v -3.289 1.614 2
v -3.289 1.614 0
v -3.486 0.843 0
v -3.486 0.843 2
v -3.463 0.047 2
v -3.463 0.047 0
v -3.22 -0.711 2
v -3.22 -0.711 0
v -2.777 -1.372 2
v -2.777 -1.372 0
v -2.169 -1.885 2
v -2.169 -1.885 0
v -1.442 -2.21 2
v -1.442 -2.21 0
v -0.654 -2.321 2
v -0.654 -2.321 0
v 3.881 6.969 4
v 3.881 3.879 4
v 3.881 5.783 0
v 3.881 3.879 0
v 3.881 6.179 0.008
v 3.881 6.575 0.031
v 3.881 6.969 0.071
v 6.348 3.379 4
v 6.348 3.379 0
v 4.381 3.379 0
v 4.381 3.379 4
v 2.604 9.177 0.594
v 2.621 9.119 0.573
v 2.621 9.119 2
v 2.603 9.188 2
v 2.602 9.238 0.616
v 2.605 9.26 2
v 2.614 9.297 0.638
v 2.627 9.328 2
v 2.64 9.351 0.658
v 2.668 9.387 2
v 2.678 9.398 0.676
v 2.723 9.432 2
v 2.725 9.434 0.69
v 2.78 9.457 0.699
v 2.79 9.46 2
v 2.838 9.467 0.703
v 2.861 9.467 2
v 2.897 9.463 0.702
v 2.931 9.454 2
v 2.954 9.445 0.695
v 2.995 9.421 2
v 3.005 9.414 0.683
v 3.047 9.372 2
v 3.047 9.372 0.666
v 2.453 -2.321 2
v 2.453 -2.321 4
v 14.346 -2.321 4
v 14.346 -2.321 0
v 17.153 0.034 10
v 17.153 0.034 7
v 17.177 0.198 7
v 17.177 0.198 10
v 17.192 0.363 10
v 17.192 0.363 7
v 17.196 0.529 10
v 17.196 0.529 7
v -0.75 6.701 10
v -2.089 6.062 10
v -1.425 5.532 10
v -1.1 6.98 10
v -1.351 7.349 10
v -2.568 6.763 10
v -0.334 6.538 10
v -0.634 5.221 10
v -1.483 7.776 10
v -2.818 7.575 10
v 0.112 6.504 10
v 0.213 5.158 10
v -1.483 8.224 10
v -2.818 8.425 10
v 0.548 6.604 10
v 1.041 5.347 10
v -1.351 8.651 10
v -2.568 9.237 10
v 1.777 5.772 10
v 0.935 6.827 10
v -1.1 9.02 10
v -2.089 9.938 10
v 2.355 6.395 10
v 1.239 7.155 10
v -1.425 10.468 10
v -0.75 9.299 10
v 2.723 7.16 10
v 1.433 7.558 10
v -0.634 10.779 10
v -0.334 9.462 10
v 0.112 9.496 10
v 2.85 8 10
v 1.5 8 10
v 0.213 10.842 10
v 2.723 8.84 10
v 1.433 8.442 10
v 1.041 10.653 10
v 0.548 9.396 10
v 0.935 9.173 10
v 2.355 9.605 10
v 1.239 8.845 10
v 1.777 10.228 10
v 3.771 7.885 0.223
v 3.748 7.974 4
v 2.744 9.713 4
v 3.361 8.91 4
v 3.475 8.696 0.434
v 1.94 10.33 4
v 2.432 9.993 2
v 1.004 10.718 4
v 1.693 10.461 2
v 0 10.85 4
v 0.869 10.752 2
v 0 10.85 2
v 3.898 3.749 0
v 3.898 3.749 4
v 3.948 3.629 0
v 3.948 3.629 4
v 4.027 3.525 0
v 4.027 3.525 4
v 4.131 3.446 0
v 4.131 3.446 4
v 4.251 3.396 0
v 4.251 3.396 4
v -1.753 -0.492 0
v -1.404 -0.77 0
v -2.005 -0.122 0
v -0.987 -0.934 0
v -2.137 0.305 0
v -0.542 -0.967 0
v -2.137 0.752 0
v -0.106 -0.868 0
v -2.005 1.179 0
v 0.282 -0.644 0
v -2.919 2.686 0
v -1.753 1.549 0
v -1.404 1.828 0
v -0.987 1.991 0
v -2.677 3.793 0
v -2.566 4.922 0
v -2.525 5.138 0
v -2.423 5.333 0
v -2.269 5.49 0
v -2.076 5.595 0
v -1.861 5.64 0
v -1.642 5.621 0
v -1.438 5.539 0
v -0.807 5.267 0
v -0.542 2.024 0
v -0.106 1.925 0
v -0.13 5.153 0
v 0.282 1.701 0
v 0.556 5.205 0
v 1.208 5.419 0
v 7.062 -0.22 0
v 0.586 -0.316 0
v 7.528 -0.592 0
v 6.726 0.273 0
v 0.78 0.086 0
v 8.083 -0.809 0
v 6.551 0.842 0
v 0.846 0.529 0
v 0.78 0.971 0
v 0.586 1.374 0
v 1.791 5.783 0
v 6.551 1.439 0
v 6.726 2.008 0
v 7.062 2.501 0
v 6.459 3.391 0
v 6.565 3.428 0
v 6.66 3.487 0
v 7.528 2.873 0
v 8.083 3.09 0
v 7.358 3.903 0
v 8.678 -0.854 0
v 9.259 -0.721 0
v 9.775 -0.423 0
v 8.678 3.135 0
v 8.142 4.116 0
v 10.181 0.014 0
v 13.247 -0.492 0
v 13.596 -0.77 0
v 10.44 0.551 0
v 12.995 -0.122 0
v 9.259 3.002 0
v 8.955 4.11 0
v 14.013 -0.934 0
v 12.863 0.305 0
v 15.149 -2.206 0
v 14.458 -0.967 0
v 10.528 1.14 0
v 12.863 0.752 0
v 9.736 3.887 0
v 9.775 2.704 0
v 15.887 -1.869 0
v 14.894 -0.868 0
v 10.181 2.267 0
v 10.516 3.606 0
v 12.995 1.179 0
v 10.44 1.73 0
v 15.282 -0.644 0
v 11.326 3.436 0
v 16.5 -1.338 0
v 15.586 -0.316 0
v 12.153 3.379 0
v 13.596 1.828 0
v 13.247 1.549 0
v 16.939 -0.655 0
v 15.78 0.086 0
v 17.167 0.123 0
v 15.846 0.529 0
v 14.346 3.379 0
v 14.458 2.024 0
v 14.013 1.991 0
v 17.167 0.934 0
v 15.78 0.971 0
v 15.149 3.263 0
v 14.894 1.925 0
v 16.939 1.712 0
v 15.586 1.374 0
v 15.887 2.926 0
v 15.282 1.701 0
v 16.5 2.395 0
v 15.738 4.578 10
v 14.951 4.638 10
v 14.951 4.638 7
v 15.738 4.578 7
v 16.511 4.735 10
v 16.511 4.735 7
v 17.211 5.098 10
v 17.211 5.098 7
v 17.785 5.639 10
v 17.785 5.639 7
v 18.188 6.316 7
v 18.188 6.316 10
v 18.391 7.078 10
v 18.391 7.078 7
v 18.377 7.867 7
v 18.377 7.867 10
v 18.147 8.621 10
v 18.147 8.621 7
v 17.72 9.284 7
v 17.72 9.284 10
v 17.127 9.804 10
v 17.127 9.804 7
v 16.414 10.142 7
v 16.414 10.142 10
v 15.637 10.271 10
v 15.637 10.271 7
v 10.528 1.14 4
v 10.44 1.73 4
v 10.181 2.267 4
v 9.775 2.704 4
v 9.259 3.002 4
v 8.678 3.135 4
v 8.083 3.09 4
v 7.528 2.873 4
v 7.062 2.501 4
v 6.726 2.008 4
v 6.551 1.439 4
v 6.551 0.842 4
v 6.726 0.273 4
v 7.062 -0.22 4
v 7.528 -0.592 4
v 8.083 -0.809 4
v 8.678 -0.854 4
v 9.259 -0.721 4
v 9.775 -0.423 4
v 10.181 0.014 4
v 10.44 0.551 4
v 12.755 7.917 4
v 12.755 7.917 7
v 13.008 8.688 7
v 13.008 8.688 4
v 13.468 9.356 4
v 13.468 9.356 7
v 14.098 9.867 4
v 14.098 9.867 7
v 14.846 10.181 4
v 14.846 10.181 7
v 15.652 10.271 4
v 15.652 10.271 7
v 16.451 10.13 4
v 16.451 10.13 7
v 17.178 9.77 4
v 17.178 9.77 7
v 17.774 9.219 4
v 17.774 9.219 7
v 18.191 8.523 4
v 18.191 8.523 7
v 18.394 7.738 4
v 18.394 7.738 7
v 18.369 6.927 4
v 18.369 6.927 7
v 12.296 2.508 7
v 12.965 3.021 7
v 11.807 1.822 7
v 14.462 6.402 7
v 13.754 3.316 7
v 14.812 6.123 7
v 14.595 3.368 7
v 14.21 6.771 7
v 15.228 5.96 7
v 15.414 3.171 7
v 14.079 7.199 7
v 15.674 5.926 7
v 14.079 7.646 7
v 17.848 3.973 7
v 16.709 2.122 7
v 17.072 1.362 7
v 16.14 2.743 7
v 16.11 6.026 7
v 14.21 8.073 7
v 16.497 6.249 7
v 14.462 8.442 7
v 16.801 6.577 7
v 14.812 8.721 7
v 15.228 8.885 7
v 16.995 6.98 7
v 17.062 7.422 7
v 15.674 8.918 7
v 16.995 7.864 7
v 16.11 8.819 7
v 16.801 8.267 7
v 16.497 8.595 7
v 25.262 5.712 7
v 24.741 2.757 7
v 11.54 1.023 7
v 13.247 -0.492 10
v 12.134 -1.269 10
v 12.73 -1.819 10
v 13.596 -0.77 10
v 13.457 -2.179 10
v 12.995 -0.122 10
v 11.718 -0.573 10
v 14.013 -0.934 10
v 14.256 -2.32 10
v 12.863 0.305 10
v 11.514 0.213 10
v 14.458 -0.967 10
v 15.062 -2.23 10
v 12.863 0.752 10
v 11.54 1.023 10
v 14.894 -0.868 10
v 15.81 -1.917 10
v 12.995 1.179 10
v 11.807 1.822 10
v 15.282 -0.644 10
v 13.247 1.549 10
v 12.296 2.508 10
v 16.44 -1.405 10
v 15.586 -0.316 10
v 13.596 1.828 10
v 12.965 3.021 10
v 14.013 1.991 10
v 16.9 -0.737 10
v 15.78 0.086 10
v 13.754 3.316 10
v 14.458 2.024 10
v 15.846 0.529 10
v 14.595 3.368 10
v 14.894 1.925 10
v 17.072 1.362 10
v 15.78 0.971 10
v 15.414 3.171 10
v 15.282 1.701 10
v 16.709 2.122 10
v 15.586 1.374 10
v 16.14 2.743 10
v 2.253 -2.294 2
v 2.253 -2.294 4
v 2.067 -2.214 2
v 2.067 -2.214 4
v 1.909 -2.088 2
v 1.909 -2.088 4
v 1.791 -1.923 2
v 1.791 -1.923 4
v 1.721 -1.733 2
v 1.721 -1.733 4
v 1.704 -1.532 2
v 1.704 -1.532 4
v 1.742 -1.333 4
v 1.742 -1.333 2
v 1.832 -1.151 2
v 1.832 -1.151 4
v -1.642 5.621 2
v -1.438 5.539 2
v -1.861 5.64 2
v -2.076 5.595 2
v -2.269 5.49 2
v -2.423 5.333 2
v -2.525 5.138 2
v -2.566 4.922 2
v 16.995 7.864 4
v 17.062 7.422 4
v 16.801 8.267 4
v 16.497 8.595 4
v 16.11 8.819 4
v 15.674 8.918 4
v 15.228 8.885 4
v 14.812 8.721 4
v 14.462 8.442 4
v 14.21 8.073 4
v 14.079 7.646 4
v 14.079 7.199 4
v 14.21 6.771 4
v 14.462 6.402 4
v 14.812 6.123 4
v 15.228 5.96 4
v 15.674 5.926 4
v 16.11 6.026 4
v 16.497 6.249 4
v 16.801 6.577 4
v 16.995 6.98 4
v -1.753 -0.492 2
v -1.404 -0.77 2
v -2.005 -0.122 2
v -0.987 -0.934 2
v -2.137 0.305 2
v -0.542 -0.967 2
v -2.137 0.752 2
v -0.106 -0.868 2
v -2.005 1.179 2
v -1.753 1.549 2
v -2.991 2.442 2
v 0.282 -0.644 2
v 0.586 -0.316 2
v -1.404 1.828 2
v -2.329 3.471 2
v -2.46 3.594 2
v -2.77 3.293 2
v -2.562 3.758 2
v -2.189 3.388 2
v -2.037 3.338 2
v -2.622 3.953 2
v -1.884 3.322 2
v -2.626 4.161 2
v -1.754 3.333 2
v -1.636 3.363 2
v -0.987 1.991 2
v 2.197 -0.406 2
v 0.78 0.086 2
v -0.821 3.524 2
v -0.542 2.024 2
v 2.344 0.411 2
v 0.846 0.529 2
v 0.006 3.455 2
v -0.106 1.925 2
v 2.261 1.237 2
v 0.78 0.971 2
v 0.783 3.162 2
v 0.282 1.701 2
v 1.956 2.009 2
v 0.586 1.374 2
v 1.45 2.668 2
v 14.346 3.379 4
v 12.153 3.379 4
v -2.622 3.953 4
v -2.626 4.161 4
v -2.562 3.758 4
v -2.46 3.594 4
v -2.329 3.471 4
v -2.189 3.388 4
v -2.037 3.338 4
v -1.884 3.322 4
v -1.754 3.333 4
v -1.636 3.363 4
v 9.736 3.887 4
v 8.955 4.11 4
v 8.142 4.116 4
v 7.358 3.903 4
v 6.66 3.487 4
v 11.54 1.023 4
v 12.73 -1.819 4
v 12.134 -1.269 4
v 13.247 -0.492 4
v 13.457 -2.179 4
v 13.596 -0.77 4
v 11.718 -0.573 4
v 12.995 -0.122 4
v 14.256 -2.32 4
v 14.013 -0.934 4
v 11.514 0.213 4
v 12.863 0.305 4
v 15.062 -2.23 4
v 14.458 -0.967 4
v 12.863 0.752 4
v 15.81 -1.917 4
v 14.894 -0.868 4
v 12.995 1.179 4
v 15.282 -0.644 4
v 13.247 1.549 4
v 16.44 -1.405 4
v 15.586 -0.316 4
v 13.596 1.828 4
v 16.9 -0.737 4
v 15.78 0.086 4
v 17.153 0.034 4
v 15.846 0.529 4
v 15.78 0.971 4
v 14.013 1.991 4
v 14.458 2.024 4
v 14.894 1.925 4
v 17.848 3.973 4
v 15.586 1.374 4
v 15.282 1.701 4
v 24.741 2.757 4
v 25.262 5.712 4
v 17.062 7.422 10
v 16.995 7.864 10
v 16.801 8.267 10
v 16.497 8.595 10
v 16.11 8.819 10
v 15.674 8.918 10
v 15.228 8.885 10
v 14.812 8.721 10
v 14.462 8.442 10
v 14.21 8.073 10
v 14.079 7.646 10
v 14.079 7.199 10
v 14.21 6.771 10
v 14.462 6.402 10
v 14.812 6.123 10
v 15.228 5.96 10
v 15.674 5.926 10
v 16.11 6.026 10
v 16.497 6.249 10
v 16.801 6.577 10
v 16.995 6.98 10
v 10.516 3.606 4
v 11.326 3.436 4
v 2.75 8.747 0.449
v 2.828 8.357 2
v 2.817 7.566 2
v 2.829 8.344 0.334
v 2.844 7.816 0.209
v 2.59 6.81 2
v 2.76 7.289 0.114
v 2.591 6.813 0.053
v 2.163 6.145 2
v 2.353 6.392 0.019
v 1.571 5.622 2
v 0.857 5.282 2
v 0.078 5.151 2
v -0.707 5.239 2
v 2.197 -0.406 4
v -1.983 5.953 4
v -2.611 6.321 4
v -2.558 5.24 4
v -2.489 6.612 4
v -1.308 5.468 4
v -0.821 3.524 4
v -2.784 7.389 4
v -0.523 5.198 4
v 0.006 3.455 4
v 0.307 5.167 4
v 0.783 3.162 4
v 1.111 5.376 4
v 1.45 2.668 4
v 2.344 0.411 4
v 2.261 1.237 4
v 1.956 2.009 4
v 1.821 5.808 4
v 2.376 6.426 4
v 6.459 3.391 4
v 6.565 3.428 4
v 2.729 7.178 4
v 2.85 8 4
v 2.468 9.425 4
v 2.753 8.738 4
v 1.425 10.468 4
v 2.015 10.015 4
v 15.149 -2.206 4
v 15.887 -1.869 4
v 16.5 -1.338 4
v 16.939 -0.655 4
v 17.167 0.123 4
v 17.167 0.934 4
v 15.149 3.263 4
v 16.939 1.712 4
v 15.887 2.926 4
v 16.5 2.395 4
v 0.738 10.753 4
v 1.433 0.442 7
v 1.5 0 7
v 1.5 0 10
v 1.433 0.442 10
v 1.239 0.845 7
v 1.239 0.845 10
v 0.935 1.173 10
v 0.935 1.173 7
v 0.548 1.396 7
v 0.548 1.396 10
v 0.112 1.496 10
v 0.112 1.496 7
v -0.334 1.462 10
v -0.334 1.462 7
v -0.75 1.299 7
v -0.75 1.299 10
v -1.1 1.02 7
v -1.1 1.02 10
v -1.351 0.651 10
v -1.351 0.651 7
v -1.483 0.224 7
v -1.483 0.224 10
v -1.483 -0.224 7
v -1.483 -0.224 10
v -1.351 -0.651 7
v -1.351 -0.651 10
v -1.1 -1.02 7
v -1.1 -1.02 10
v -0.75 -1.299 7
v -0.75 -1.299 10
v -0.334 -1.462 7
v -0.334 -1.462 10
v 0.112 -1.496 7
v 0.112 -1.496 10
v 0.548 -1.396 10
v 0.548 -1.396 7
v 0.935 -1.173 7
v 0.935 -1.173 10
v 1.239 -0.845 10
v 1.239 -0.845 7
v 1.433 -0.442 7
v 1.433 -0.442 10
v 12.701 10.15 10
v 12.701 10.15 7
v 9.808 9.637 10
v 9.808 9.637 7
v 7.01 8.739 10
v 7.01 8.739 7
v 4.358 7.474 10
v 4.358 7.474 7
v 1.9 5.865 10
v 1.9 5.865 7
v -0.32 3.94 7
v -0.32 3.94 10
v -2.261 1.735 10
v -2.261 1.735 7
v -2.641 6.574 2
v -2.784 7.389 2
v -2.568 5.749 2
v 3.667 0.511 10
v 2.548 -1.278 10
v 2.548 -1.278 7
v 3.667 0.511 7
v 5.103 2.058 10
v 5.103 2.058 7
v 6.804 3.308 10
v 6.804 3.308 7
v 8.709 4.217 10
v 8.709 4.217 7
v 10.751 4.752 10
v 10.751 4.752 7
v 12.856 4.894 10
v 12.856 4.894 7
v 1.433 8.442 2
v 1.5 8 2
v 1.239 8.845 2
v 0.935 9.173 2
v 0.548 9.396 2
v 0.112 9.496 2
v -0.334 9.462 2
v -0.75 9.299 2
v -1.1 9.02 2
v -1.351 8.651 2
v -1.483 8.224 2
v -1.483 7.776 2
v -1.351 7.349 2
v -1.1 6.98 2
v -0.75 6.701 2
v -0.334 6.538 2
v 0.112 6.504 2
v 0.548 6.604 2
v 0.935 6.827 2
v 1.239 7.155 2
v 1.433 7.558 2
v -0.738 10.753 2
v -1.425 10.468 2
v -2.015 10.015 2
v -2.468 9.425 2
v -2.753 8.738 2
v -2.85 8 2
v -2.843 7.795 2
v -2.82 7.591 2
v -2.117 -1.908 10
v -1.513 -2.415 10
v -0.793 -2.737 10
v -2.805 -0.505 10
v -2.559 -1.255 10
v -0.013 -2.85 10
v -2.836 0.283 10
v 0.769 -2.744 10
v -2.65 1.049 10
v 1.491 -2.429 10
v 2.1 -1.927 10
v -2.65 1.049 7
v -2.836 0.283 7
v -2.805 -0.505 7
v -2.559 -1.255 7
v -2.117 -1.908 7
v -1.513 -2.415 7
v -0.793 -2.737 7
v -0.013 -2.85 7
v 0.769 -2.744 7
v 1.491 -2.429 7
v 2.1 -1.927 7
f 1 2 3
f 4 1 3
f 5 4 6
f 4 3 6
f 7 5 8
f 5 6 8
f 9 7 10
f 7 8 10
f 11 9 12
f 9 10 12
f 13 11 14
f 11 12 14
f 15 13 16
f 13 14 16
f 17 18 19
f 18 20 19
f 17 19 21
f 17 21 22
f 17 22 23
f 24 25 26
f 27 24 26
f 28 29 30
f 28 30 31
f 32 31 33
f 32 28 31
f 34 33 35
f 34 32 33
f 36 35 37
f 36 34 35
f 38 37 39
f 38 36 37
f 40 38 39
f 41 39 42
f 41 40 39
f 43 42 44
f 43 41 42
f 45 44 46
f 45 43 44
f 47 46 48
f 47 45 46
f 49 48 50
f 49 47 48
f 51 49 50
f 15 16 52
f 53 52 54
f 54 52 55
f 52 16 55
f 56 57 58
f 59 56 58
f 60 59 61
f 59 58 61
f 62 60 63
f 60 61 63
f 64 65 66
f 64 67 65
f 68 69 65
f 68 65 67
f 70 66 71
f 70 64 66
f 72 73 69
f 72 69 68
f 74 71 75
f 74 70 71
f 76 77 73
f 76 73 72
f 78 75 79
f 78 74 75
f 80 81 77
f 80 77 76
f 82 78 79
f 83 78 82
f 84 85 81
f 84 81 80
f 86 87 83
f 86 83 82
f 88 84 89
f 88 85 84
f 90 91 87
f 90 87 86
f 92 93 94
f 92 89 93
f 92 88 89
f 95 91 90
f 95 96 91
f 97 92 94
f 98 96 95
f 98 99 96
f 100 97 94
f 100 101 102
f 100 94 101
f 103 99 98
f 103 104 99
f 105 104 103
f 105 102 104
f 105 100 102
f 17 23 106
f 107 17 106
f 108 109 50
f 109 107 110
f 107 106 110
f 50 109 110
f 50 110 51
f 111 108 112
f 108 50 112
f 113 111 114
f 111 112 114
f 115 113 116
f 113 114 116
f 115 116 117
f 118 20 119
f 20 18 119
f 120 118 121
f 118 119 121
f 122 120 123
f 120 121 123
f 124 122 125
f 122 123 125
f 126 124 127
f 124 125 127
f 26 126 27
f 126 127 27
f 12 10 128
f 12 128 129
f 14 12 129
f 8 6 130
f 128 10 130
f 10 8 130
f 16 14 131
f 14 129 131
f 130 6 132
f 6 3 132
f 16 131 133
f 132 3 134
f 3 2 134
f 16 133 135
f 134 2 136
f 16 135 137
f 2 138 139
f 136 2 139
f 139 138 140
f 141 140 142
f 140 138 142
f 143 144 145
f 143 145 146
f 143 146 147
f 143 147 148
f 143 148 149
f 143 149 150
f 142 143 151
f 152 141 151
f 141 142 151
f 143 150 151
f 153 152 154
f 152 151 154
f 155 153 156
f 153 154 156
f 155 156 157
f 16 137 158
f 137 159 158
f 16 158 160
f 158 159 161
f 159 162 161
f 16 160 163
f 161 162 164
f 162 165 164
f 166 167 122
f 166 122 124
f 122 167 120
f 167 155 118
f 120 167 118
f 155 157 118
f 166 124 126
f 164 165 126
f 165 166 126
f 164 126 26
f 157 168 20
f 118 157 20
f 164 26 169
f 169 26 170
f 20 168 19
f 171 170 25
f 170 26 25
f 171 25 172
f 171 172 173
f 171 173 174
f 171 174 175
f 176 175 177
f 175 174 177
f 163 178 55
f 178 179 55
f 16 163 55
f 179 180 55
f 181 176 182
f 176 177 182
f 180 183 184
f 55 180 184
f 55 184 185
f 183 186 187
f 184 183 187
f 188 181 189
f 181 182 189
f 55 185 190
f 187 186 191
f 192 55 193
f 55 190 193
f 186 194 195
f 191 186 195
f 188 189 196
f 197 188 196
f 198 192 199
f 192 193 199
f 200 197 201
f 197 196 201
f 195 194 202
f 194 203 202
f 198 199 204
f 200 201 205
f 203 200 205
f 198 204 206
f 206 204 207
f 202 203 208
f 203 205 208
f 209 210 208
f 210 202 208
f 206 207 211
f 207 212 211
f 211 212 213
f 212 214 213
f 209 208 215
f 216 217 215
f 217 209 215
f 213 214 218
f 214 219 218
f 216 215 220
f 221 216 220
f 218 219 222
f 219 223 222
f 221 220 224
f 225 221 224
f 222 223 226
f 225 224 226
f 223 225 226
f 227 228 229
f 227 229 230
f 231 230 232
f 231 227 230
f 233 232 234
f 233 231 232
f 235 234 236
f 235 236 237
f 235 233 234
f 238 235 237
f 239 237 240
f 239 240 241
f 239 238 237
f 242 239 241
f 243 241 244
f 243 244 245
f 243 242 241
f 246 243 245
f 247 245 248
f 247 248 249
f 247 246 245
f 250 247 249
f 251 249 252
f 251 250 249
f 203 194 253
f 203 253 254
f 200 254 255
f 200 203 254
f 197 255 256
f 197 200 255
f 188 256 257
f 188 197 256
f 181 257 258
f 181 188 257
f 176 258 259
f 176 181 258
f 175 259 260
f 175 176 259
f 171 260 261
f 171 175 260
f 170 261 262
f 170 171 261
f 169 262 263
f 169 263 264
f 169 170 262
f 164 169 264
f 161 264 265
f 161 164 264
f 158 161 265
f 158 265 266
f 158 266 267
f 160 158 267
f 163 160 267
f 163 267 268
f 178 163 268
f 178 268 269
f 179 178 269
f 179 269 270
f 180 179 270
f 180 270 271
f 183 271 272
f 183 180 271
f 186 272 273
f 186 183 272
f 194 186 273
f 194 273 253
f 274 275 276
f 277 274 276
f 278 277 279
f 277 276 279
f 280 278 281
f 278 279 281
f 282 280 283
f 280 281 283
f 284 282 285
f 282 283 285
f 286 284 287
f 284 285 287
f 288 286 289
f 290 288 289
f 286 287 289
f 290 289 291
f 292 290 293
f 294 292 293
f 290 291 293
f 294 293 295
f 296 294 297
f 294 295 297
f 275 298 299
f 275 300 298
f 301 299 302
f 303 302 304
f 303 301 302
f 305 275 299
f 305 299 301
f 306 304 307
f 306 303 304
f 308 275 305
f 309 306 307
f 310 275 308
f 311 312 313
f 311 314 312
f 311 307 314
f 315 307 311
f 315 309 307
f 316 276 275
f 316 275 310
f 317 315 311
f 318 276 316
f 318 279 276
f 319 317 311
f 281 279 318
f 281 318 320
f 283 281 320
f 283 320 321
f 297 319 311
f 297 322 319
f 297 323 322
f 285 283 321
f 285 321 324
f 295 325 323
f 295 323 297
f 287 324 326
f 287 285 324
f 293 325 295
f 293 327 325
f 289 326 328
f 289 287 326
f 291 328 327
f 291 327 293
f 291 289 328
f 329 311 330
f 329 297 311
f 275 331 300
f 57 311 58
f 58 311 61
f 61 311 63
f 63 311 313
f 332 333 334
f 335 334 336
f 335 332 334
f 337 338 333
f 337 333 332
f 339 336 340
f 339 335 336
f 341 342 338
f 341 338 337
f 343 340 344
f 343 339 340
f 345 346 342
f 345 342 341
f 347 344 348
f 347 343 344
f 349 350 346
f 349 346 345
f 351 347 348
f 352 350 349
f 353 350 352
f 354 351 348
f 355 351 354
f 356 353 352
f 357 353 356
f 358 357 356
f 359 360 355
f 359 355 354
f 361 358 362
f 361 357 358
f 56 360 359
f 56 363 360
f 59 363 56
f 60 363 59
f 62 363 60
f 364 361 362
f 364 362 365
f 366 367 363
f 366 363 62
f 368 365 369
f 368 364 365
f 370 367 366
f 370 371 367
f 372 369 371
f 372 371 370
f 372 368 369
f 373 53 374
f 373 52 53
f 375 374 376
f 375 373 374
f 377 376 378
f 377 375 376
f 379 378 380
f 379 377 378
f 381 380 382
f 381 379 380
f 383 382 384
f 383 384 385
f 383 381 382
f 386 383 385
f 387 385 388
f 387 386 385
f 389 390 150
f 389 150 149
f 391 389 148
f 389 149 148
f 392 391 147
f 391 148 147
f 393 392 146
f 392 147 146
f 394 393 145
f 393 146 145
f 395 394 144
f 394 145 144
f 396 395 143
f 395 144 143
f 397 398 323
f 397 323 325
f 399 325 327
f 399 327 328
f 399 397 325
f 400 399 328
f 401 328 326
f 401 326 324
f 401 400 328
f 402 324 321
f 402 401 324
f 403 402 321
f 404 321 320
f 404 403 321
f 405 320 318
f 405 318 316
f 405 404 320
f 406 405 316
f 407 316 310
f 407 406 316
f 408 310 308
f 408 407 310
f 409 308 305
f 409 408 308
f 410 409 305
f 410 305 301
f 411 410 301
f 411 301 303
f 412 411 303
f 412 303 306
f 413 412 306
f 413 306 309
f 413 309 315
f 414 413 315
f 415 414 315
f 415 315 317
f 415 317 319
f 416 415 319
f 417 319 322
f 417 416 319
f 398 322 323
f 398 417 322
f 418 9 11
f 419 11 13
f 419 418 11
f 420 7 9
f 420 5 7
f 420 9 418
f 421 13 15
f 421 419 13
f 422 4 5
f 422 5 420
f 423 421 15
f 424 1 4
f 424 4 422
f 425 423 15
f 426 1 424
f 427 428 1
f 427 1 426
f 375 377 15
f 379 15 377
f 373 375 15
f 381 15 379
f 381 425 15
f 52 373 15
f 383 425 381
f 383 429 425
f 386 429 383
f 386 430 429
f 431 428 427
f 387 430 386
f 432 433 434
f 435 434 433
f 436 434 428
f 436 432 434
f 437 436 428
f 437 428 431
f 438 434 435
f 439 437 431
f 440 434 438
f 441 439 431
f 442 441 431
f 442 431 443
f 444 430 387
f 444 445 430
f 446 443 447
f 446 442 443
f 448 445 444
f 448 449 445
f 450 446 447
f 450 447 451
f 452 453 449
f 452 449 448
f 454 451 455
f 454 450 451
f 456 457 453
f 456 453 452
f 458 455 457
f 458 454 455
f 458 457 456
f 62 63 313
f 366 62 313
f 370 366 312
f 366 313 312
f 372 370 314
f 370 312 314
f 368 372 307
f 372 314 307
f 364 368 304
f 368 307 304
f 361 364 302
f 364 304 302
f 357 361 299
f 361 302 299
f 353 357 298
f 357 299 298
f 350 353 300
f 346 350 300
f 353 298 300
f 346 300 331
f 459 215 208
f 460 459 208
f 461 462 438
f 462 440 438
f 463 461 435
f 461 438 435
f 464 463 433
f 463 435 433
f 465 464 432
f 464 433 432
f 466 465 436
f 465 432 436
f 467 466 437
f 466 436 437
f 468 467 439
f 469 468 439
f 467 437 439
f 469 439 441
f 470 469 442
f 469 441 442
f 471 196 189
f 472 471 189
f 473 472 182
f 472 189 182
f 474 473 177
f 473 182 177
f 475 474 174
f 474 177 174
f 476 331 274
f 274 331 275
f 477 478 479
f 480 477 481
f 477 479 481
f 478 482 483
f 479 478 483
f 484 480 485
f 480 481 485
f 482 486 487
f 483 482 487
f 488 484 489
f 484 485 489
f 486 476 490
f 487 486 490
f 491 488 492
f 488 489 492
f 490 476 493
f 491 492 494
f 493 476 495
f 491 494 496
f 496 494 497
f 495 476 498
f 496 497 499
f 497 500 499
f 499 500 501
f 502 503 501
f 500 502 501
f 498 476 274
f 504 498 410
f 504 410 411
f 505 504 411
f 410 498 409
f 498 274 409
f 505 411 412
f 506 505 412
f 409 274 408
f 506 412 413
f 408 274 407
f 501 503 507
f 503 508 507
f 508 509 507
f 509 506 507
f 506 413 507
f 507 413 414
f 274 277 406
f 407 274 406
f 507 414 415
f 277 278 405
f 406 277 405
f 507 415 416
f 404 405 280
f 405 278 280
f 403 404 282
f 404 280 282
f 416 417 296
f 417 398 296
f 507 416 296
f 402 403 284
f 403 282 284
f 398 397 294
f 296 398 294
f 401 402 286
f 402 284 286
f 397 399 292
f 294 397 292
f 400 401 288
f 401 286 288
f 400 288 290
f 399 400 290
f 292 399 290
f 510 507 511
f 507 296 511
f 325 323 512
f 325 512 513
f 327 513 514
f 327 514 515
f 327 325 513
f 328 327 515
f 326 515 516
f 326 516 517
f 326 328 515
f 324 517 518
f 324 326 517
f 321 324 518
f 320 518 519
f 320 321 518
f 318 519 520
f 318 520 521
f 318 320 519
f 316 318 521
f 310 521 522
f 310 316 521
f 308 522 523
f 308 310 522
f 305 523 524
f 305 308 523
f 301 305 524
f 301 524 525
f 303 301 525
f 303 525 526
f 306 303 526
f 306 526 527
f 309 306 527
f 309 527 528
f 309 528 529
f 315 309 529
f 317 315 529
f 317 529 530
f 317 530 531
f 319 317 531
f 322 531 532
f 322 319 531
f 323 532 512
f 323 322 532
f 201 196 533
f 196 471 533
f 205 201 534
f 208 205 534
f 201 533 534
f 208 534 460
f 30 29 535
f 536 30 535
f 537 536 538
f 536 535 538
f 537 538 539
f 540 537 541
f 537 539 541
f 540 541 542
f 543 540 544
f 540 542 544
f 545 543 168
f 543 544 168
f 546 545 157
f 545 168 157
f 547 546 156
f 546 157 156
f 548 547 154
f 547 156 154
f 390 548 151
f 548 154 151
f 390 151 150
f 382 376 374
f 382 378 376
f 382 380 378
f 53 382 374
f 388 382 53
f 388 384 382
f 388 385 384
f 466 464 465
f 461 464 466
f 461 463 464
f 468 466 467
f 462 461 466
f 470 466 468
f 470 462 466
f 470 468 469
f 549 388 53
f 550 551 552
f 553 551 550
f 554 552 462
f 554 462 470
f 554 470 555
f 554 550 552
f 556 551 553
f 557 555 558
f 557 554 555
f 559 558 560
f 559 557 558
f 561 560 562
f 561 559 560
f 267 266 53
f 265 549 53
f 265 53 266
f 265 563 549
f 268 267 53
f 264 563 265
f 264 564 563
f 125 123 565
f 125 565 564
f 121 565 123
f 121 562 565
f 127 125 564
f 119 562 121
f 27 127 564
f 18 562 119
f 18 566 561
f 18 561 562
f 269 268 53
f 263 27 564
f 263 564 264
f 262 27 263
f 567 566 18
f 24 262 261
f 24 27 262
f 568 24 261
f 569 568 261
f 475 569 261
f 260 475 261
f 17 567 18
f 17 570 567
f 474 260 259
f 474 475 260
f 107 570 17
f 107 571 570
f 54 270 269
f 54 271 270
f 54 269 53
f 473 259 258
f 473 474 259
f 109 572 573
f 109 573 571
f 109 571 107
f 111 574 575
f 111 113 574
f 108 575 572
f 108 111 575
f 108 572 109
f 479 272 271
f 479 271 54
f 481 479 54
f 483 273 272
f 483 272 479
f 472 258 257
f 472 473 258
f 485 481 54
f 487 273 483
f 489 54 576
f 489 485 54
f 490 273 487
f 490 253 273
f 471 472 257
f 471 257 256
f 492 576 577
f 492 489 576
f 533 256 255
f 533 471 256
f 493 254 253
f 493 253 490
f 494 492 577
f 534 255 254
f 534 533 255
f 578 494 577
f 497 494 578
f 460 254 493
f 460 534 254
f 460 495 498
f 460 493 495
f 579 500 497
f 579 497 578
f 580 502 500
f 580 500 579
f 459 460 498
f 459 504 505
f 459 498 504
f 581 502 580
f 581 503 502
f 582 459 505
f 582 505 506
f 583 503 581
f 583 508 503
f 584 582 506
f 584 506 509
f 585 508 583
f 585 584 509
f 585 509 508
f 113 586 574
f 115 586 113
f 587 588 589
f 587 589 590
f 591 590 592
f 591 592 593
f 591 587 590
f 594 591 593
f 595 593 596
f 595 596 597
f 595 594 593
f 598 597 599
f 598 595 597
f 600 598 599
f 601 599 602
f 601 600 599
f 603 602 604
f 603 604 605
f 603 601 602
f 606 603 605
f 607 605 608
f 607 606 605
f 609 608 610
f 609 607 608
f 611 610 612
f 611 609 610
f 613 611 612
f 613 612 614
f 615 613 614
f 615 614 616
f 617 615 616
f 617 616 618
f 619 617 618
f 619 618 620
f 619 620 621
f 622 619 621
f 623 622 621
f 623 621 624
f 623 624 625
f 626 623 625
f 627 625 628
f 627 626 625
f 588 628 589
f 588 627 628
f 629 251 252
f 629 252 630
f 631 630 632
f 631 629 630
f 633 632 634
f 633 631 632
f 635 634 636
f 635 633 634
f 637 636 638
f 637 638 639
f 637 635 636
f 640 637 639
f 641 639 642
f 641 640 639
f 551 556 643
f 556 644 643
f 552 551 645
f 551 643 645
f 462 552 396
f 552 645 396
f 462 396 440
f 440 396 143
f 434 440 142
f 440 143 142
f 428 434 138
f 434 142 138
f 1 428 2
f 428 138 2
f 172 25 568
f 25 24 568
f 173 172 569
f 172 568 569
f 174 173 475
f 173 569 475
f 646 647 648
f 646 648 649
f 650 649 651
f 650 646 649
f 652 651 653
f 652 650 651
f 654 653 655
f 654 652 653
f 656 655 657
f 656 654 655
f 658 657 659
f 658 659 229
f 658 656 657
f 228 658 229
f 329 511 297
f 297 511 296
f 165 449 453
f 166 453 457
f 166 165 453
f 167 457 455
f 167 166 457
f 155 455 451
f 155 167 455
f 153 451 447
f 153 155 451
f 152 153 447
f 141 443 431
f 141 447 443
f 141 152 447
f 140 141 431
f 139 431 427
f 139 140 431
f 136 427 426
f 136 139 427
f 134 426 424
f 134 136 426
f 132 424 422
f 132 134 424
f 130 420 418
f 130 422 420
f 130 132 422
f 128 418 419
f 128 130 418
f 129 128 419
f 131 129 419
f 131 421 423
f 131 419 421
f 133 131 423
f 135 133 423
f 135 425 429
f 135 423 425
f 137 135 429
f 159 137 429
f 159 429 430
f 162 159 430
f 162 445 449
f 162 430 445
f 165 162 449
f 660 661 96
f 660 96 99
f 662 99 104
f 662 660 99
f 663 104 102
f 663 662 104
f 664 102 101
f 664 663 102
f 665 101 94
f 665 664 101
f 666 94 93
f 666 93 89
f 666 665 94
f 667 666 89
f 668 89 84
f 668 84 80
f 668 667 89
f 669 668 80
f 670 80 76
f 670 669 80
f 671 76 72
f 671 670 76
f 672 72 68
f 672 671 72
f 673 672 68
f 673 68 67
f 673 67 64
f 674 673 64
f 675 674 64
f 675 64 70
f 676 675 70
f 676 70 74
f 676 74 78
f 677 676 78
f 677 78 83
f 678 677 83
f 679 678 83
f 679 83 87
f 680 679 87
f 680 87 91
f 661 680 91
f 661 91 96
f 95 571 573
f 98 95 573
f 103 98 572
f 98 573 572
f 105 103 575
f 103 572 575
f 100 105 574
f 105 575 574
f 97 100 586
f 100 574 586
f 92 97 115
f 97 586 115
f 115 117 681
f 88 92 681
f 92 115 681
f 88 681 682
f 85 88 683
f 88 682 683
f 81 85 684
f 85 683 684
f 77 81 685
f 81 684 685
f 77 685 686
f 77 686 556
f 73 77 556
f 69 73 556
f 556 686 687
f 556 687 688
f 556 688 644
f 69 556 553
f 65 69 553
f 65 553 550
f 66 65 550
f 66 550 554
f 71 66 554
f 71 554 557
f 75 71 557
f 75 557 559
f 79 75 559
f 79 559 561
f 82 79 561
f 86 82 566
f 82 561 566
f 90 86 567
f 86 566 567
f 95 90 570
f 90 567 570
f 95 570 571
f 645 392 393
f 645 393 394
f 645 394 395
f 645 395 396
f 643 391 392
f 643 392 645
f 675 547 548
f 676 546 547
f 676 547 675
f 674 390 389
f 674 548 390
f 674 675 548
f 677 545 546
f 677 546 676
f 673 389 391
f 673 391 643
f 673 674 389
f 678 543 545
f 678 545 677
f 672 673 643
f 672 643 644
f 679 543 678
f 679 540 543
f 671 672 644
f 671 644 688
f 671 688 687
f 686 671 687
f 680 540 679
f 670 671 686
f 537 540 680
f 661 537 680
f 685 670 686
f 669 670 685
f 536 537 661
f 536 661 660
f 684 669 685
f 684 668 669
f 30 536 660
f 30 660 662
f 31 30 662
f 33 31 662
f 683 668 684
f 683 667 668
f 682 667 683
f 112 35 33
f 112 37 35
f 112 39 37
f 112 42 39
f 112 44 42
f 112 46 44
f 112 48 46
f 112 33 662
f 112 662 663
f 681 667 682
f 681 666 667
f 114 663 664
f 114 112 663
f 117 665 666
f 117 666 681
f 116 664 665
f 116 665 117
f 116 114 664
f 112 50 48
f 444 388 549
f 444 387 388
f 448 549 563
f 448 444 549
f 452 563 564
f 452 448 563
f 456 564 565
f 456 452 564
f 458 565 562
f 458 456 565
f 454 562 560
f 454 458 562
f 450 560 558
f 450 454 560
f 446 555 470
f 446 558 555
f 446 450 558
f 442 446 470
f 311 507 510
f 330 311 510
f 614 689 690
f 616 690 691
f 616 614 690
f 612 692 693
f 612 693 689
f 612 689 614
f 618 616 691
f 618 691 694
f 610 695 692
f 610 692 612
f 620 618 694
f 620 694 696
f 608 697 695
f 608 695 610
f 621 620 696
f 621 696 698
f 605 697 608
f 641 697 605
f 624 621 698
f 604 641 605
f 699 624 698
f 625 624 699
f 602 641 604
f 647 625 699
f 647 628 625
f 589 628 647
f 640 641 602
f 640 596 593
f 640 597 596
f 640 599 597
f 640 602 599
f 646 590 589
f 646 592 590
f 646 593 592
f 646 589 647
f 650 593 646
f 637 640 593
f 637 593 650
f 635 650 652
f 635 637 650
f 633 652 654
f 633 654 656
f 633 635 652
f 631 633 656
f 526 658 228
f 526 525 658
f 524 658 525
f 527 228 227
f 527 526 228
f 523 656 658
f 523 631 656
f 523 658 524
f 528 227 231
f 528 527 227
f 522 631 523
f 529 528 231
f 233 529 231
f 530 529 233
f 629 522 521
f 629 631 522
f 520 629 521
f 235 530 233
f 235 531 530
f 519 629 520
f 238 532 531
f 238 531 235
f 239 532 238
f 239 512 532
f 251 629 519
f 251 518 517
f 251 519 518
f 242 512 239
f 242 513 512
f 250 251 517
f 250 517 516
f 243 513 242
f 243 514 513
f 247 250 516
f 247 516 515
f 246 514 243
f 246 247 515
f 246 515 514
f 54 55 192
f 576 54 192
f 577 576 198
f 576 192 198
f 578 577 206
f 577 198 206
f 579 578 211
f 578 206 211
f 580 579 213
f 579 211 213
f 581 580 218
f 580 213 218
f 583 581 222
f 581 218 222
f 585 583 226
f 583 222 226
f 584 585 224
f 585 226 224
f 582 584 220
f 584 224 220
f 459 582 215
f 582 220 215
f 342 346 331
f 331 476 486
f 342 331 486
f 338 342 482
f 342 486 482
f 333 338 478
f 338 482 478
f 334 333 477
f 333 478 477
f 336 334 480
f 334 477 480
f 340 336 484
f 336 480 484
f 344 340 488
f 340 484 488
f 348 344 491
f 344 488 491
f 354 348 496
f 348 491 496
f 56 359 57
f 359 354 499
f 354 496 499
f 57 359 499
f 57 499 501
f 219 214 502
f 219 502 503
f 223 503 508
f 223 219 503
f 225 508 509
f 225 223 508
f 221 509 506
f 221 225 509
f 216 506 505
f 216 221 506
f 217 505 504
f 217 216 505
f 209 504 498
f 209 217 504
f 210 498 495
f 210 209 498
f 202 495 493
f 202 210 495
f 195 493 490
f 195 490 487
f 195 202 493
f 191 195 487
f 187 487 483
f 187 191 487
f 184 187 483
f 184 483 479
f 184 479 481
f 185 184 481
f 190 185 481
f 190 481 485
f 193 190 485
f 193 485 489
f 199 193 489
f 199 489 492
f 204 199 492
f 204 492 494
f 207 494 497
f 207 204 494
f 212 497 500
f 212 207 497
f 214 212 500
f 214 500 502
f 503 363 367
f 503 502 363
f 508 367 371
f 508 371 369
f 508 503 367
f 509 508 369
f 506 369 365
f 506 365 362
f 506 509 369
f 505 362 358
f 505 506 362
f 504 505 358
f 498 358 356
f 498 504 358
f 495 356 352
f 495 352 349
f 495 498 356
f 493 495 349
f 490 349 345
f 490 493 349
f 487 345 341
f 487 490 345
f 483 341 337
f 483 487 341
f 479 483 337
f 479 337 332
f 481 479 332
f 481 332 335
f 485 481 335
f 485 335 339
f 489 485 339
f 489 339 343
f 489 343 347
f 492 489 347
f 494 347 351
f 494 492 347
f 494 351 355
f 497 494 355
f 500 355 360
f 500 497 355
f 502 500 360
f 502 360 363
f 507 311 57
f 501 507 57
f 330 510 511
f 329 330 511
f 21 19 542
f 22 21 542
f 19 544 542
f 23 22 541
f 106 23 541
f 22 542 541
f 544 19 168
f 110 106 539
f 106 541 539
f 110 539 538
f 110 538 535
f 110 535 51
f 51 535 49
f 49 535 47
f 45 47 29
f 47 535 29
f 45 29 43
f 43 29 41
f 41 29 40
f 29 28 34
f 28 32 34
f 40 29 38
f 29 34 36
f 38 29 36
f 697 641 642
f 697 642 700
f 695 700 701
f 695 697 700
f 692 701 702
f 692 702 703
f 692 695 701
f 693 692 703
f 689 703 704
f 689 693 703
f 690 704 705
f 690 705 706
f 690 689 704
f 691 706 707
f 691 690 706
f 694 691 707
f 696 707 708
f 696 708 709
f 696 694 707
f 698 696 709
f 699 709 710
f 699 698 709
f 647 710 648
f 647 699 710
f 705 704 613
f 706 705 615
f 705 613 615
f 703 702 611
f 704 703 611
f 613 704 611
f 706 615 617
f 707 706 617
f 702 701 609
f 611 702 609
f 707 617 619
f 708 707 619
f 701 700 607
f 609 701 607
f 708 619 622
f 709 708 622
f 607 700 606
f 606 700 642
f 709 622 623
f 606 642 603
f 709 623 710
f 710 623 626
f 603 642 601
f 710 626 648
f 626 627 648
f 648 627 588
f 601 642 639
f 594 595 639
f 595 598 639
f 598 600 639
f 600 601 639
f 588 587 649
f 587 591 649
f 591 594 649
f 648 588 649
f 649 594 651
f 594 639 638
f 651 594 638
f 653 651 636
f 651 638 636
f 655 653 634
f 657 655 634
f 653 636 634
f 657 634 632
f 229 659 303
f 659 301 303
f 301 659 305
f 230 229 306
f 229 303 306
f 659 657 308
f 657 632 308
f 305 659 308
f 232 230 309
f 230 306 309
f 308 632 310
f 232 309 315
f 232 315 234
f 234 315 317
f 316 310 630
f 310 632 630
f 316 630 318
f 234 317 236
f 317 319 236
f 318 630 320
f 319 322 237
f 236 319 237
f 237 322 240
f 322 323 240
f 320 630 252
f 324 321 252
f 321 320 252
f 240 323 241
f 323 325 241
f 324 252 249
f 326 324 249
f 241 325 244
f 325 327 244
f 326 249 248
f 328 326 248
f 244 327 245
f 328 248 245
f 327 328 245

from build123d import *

# Parameters (mm, degrees)
SKETCH1_R            = 2.85
BOSS_EXTRUDE1_DEPTH  = 10
SKETCH1_3_R          = 2
BOSS_EXTRUDE2_DEPTH  = 4
SKETCH2_R            = 2.85
BOSS_EXTRUDE3_DEPTH  = 3
BOSS_EXTRUDE5_DEPTH  = 3
HOLE1_START          = 4
HOLE1_OUTLINE_R      = 1.5
HOLE1_DEPTH          = 3
HOLE1_START_2        = 7
HOLE1_2_OUTLINE_R    = 1.5
HOLE1_2_DEPTH        = 3
HOLE2_START          = 4
HOLE2_OUTLINE_R      = 1.5
HOLE2_DEPTH          = 3
HOLE2_2_OUTLINE_R    = 1.5
HOLE2_2_DEPTH        = 4
HOLE3_START          = -1
HOLE3_OUTLINE_R      = 1.5
HOLE3_DEPTH          = 11
HOLE4_OUTLINE_R      = 1.5
HOLE4_DEPTH          = 4
HOLE5_START          = 7
HOLE5_OUTLINE_R      = 1.5
HOLE5_DEPTH          = 3
SKETCH9_R            = 1.5
CUT_EXTRUDE1_DEPTH   = 2
CUT_EXTRUDE2_START   = -2
SKETCH10_R           = 3
SKETCH10_R_2         = 1.5
CUT_EXTRUDE2_DEPTH   = 2
SKETCH13_R           = 1.5
BOSS_EXTRUDE7_DEPTH  = 3
MOVE_START           = 3.380946094
MOVE_FACE1_OUTLINE_W = 7
MOVE_FACE1_OUTLINE_H = 6
MOVE_FACE1_DEPTH     = 2.619053906
FILLET3_R            = 10
FILLET4_START        = 0.070618077
FILLET4_DEPTH        = 1.929381923
FILLET6_R            = 0.75
FILLET1_R            = 0.5
FILLET2_R            = 6
FILLET7_R            = 0.75
BOSS_EXTRUDE6_DEPTH  = 3


with BuildPart() as part:
    # Sketch1 → Boss-Extrude1 (new body)
    with BuildSketch(Plane.XY):
        with Locations((0, 8)):
            Circle(SKETCH1_R)
    extrude(amount=BOSS_EXTRUDE1_DEPTH)

    # Sketch1<3> → Boss-Extrude2 (add)
    with BuildSketch(Plane.XY):
        with BuildLine():
            ThreePointArc((-3.288892787, 1.613938628), (-3.021777735, -1.057195592), (-0.653668071, -2.321460236))
            Line((-0.653668071, -2.321460236), (14.346331929, -2.321460236))
            ThreePointArc((14.346331929, -2.321460236), (17.196331929, 0.528539764), (14.346331929, 3.378539764))
            Line((14.346331929, 3.378539764), (10.52622042, 3.378539764))
            ThreePointArc((10.52622042, 3.378539764), (8.52842804, 4.140499191), (6.530635661, 3.378539764))
            Line((6.530635661, 3.378539764), (3.880617573, 3.378539764))
            Line((3.880617573, 3.378539764), (3.880617573, 6.969382427))
            ThreePointArc((3.880617573, 6.969382427), (2.744011001, 9.713393428), (0, 10.85))
            ThreePointArc((0, 10.85), (2.220892349, 6.213904489), (-2.783667267, 7.388692754))
            ThreePointArc((-2.783667267, 7.388692754), (-2.594814655, 4.462692475), (-3.288892787, 1.613938628))
        make_face()
        with Locations((8.52842804, 1.140499191)):
            Circle(SKETCH1_3_R, mode=Mode.SUBTRACT)
    extrude(amount=BOSS_EXTRUDE2_DEPTH)

    # Hole2 2 outline → Hole2 2 (cut)
    with BuildSketch(Plane.XY):
        with Locations((14.346331929, 0.528539764)):
            Circle(HOLE2_2_OUTLINE_R)
    extrude(amount=HOLE2_2_DEPTH, mode=Mode.SUBTRACT)

    # Hole3: read off the stored shape, not the designer's step
    # Hole3 outline → Hole3 (cut)
    with BuildSketch(Plane.XY.offset(HOLE3_START)):
        with Locations((0, 8)):
            Circle(HOLE3_OUTLINE_R)
    extrude(amount=HOLE3_DEPTH, mode=Mode.SUBTRACT)

    # Hole4: read off the stored shape, not the designer's step
    # Hole4 outline → Hole4 (cut)
    with BuildSketch(Plane.XY):
        with Locations((-0.653668071, 0.528539764)):
            Circle(HOLE4_OUTLINE_R)
    extrude(amount=HOLE4_DEPTH, mode=Mode.SUBTRACT)

    # Sketch9 → Cut-Extrude1 (cut)
    with BuildSketch(Plane(origin=(0, 0, 0), x_dir=(-1, 0, 0), z_dir=(0, 0, -1))):
        with BuildLine():
            ThreePointArc((2.783667267, 7.388692754), (2.833368288, 7.692552207), (2.85, 8))
            ThreePointArc((2.85, 8), (2.015254326, 10.015254326), (0, 10.85))
            ThreePointArc((0, 10.85), (-2.220892349, 6.213904489), (2.783667267, 7.388692754))
        make_face()
        with Locations((0, 8)):
            Circle(SKETCH9_R, mode=Mode.SUBTRACT)
    extrude(amount=-CUT_EXTRUDE1_DEPTH, mode=Mode.SUBTRACT)

    # Sketch10 → Cut-Extrude2 (cut)
    with BuildSketch(Plane.XY.offset(4).offset(CUT_EXTRUDE2_START)):
        with Locations((-0.653668071, 0.528539764)):
            Circle(SKETCH10_R)
        with Locations(Location((-0.653668071, 0.528539764, 0), (0, 0, 180))):
            Circle(SKETCH10_R_2, mode=Mode.SUBTRACT)
    extrude(amount=CUT_EXTRUDE2_DEPTH, mode=Mode.SUBTRACT)

    # Move Face1: read off the stored shape, not the designer's step
    # Move Face1 outline → Move Face1 (cut)
    with BuildSketch(Plane(origin=(0, 0, 0), x_dir=(1, 0, 0), z_dir=(0, 0.4226182617406999, -0.9063077870366498)).offset(MOVE_START)):
        with Locations((1.5, -9)):
            Rectangle(MOVE_FACE1_OUTLINE_W, MOVE_FACE1_OUTLINE_H)
    extrude(amount=MOVE_FACE1_DEPTH, mode=Mode.SUBTRACT)

    # Fillet3
    fillet3_edges = [part.edges().sort_by_distance(p)[0] for p in [
        (3.295629584, 8, 0),
    ]]
    fillet(fillet3_edges, radius=FILLET3_R)

    # Fillet4: read off the stored shape, not the designer's step
    # Fillet4 outline → Fillet4 (cut)
    with BuildSketch(Plane.XY.offset(FILLET4_START)):
        with BuildLine():
            ThreePointArc((2.621064074, 9.119161794), (2.723389269, 9.432322489), (3.047297197, 9.37212514))
            ThreePointArc((3.047297197, 9.37212514), (1.693379336, 10.461038076), (0, 10.85))
            ThreePointArc((0, 10.85), (1.570491784, 10.378246319), (2.621064074, 9.119161794))
        make_face()
    extrude(amount=FILLET4_DEPTH, mode=Mode.SUBTRACT)

    # Fillet6
    # the kernel refuses this fillet: 0.75 mm, written as the material it takes off along each edge
    with BuildSketch(Plane(origin=(-2.783667267, 7.388692754, -6.191769665), x_dir=(0.5884037182899365, -0.80856729114068, 0), z_dir=(0, 0, 1))) as fillet6_piece_1:
        with BuildLine():
            CenterArc((2.588231391, -0.686967831), FILLET6_R, 113.657983214, 118.014627982)
            ThreePointArc((2.123115813, -1.275327839), (1.102428919, -0.569623459), (0, 0))
            ThreePointArc((0, 0), (1.143637126, -0.239522242), (2.287274252, 0))
        make_face()
    extrude(amount=8.191769665, mode=Mode.SUBTRACT)

    # Fillet1
    fillet1_edges = [part.edges().sort_by_distance(p)[0] for p in [
        (3.880617573, 3.378539764, 2),
        (6.530635661, 3.378539764, 2),
    ]]
    fillet(fillet1_edges, radius=FILLET1_R)

    # Fillet2
    fillet2_edges = [part.edges().sort_by_distance(p)[0] for p in [
        (10.52622042, 3.378539764, 2),
    ]]
    fillet(fillet2_edges, radius=FILLET2_R)

    # Fillet7
    fillet7_edges = [part.edges().sort_by_distance(p)[0] for p in [
        (-3.007860636, 2.388049745, 3),
        (0.283081629, -2.321460236, 3),
    ]]
    fillet(fillet7_edges, radius=FILLET7_R)


with BuildPart() as body_2:
    # Sketch2 → Boss-Extrude3 (new body)
    with BuildSketch(Plane.XY.offset(10)):
        Circle(SKETCH2_R)
        with BuildLine():
            ThreePointArc((-2.260997744, 1.73504732), (0.916148577, 2.69873522), (2.85, 0))
            ThreePointArc((2.85, 0), (2.77335805, -0.656494575), (2.547554297, -1.277680361))
            ThreePointArc((2.547554297, -1.277680361), (7.734848749, 3.807723671), (14.951458123, 4.638330111))
            ThreePointArc((14.951458123, 4.638330111), (12.732714566, 7.766264099), (15.636506436, 10.271216548))
            ThreePointArc((15.636506436, 10.271216548), (5.663103388, 8.151483767), (-2.260997744, 1.73504732))
        make_face()
        with Locations((15.561869173, 7.422194035)):
            Circle(SKETCH2_R)
    extrude(amount=-BOSS_EXTRUDE3_DEPTH)

    # Hole1 2 outline → Hole1 2 (cut)
    with BuildSketch(Plane.XY.offset(HOLE1_START_2)):
        with Locations((15.561869173, 7.422194035)):
            Circle(HOLE1_2_OUTLINE_R)
    extrude(amount=HOLE1_2_DEPTH, mode=Mode.SUBTRACT)

    # Hole5: read off the stored shape, not the designer's step
    # Hole5 outline → Hole5 (cut)
    with BuildSketch(Plane.XY.offset(HOLE5_START)):
        Circle(HOLE5_OUTLINE_R)
    extrude(amount=HOLE5_DEPTH, mode=Mode.SUBTRACT)


with BuildPart() as body_3:
    # Sketch3 → Boss-Extrude5 (new body)
    with BuildSketch(Plane(origin=(0, 0, 7), x_dir=(-1, 0, 0), z_dir=(0, 0, -1))):
        with BuildLine():
            ThreePointArc((-12.755167077, 7.917091342), (-16.056766479, 10.228896131), (-18.368571269, 6.927296729))
            Line((-18.368571269, 6.927296729), (-17.153034025, 0.033642458))
            ThreePointArc((-17.153034025, 0.033642458), (-13.851434623, -2.278162332), (-11.539629833, 1.023437071))
            Line((-11.539629833, 1.023437071), (-12.755167077, 7.917091342))
        make_face()
    extrude(amount=BOSS_EXTRUDE5_DEPTH)

    # Hole1: read off the stored shape, not the designer's step
    # Hole1 outline → Hole1 (cut)
    with BuildSketch(Plane.XY.offset(HOLE1_START)):
        with Locations((15.561869173, 7.422194035)):
            Circle(HOLE1_OUTLINE_R)
    extrude(amount=HOLE1_DEPTH, mode=Mode.SUBTRACT)

    # Hole2: read off the stored shape, not the designer's step
    # Hole2 outline → Hole2 (cut)
    with BuildSketch(Plane.XY.offset(HOLE2_START)):
        with Locations((14.346331929, 0.528539764)):
            Circle(HOLE2_OUTLINE_R)
    extrude(amount=HOLE2_DEPTH, mode=Mode.SUBTRACT)

    # Sketch13 → Boss-Extrude7 (add)
    with BuildSketch(Plane.XY.offset(7)):
        with BuildLine():
            ThreePointArc((17.153034025, 0.033642458), (17.185486819, 0.280145897), (17.196331929, 0.528539764))
            ThreePointArc((17.196331929, 0.528539764), (14.594725796, 3.367694654), (11.539629833, 1.023437071))
            ThreePointArc((11.539629833, 1.023437071), (13.851434623, -2.278162332), (17.153034025, 0.033642458))
        make_face()
        with Locations((14.346331929, 0.528539764)):
            Circle(SKETCH13_R, mode=Mode.SUBTRACT)
    extrude(amount=BOSS_EXTRUDE7_DEPTH)

    # Sketch12 → Boss-Extrude6 (add)
    with BuildSketch(Plane(origin=(0, 0, 4), x_dir=(-1, 0, 0), z_dir=(0, 0, -1))):
        Polygon((-18.368571269, 6.927296729), (-17.847626736, 3.97287347), (-24.741281007, 2.757336226), (-25.26222554, 5.711759485), align=None)
    extrude(amount=-BOSS_EXTRUDE6_DEPTH)


solid = Compound([part.part, body_2.part, body_3.part])
